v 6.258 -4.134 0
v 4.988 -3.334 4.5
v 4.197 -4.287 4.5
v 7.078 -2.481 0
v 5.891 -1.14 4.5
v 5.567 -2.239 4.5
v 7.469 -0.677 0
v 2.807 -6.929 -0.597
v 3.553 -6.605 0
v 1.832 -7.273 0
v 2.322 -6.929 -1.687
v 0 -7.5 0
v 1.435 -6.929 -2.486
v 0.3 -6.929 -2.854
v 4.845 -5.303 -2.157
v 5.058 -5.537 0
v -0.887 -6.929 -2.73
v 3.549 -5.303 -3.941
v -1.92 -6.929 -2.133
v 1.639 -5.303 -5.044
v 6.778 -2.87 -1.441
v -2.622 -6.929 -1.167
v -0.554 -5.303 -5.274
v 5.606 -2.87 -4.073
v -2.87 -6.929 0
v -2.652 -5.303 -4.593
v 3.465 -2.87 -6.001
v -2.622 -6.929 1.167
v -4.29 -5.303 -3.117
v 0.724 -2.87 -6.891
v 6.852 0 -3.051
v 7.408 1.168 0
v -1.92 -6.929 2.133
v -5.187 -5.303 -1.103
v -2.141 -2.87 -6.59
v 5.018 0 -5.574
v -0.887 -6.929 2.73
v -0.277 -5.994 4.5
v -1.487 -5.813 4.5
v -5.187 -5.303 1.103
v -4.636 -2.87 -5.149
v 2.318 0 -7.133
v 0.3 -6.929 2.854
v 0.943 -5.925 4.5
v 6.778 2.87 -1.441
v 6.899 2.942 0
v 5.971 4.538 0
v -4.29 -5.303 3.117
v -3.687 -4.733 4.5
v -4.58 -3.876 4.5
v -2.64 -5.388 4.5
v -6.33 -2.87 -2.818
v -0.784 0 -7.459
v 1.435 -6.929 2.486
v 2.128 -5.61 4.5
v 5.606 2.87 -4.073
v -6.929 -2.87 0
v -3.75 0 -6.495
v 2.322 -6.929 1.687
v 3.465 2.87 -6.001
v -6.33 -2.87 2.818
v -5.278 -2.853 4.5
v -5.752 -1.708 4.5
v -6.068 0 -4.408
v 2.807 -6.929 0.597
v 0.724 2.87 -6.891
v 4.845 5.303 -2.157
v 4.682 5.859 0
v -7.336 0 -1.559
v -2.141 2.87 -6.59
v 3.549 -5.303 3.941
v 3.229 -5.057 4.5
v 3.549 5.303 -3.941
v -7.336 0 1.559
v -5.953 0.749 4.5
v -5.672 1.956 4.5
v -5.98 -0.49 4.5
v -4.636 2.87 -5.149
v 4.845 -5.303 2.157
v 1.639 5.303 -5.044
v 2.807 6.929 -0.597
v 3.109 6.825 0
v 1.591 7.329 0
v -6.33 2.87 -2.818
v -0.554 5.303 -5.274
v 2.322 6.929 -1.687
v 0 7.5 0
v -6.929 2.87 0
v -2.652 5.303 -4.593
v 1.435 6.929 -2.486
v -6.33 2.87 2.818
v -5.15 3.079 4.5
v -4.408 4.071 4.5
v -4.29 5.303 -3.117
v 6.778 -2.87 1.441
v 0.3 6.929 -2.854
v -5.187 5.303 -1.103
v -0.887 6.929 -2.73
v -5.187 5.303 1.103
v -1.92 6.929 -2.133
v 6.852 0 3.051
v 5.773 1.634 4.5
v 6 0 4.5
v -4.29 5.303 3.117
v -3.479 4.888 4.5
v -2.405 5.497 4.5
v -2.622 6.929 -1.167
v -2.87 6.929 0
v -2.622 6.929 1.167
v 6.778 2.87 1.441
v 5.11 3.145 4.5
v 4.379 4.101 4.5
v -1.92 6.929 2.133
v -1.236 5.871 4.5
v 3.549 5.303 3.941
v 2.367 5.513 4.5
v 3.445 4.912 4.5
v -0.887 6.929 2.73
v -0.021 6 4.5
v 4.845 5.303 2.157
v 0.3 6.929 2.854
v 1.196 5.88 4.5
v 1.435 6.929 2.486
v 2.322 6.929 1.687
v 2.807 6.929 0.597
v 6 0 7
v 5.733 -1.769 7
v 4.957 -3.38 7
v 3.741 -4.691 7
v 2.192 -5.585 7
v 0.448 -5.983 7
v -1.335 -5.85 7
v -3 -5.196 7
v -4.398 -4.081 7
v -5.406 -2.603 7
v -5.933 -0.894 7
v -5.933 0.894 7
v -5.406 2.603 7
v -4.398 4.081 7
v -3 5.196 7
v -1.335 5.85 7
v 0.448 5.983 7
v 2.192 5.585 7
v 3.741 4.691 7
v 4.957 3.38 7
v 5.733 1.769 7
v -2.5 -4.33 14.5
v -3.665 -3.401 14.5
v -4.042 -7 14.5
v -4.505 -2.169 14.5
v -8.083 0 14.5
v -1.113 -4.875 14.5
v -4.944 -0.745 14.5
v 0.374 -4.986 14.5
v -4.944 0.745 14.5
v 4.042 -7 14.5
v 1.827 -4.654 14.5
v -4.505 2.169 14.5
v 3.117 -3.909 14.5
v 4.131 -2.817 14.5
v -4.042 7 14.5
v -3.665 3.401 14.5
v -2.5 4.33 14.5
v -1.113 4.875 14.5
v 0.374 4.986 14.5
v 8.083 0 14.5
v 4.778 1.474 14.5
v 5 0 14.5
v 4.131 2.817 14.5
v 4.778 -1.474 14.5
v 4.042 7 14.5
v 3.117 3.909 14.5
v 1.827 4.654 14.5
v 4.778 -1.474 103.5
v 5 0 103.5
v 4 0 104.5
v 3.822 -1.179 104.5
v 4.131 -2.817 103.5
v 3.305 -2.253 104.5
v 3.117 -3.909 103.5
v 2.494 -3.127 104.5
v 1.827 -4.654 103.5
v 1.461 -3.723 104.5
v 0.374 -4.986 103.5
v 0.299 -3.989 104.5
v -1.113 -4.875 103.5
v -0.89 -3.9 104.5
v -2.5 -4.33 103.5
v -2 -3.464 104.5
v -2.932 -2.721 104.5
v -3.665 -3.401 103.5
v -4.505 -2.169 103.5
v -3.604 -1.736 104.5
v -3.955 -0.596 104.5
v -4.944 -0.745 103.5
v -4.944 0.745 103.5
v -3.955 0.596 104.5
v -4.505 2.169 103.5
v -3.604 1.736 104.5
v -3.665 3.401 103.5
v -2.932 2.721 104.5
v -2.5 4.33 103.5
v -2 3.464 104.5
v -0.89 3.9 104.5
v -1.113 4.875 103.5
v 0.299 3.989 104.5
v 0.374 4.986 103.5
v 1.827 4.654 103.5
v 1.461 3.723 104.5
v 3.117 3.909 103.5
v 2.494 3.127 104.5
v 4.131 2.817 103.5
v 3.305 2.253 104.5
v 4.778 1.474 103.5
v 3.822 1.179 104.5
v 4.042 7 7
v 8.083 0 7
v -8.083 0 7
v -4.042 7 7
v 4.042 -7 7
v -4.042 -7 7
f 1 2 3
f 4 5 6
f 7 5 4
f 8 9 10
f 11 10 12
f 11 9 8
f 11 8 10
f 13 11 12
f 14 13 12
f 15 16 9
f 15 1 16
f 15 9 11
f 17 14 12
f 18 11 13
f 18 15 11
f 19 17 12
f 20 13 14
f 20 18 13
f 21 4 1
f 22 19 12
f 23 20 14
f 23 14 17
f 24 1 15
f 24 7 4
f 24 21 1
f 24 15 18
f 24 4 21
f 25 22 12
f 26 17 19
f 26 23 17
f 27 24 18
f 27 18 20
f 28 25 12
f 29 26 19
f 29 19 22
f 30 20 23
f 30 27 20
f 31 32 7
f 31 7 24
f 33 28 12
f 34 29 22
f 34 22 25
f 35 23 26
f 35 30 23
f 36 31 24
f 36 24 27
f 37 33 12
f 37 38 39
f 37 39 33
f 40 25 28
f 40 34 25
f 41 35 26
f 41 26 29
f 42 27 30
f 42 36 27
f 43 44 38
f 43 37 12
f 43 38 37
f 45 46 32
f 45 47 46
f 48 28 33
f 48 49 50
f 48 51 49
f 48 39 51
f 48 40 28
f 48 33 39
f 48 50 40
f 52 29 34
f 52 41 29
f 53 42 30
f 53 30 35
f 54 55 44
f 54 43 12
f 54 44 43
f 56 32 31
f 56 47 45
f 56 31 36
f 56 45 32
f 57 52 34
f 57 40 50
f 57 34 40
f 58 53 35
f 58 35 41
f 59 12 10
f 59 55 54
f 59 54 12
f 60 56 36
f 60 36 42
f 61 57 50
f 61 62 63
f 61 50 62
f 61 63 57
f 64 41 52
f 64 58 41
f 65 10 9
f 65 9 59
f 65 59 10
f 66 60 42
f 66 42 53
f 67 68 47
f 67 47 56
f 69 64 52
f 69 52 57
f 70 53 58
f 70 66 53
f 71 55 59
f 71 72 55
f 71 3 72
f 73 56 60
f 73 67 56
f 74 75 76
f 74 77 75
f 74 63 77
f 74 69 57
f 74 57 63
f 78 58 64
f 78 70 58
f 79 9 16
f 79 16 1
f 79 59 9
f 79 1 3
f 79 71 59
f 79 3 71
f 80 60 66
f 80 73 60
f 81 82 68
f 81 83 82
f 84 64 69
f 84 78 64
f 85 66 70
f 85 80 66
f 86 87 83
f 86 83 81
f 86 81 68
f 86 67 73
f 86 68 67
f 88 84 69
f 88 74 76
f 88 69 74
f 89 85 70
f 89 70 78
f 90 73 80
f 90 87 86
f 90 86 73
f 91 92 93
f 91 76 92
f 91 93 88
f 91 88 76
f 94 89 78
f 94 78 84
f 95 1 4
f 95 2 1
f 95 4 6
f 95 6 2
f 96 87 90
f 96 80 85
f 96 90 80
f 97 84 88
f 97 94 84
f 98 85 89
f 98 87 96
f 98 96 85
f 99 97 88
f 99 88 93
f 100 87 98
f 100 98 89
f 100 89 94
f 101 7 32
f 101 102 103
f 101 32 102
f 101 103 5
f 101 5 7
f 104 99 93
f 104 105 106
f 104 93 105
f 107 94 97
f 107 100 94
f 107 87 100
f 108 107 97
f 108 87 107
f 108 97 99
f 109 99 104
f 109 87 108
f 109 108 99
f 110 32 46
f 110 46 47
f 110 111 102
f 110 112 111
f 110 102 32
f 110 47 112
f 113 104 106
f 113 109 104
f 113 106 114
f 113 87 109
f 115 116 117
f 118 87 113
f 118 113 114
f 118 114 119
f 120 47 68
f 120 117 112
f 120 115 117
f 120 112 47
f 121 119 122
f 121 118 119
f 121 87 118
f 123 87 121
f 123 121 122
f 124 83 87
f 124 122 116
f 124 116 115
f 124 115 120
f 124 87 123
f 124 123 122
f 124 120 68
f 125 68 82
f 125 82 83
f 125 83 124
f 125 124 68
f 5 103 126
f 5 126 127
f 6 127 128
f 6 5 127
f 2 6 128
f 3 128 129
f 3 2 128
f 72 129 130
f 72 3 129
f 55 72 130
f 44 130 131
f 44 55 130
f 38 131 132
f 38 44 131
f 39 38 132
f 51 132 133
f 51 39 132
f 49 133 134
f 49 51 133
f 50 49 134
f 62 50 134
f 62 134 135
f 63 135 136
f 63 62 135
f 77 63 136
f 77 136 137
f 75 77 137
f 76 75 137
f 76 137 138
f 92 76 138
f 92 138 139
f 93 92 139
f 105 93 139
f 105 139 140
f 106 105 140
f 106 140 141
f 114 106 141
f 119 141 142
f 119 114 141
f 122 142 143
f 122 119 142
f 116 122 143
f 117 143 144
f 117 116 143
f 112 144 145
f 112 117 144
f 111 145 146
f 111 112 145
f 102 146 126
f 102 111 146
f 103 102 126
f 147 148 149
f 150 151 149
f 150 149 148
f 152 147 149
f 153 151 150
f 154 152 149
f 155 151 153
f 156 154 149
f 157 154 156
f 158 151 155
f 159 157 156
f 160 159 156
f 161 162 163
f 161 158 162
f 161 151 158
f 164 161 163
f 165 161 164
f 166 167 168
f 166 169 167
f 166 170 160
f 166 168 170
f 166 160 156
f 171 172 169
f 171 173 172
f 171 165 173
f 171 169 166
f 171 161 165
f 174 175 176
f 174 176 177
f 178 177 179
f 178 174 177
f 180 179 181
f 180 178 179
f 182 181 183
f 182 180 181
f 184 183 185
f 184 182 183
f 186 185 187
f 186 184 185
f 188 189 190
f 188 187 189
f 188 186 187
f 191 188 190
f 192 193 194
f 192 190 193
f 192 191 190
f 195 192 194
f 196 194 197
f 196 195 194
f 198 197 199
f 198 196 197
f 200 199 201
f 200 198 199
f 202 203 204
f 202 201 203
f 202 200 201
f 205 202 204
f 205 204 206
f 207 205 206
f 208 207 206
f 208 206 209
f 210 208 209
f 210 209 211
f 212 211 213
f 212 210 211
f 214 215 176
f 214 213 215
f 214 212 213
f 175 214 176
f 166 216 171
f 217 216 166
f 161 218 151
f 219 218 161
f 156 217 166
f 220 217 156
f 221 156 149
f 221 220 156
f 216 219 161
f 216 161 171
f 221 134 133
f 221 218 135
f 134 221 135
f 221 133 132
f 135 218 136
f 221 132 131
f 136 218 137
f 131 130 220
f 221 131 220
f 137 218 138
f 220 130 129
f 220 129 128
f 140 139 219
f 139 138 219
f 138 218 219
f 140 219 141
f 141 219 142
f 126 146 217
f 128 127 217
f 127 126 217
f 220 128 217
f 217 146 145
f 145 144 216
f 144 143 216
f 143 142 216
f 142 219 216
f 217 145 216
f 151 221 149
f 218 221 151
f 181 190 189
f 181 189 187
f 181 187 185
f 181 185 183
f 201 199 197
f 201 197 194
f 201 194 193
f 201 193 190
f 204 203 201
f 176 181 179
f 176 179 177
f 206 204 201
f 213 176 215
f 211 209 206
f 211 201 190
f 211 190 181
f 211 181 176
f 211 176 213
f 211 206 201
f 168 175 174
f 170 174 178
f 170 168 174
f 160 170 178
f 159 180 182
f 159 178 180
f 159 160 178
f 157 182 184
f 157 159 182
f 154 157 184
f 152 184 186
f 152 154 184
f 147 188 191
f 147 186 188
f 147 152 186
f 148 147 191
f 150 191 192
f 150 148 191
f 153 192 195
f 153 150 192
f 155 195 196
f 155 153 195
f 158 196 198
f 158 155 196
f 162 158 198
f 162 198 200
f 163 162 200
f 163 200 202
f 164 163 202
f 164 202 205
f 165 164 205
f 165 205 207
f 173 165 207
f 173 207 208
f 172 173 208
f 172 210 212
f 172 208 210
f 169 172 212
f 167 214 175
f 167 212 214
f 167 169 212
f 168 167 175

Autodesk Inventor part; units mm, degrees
ref_plane "YZ Plane" through (0, 0, 0) normal (1, 0, 0) x (0, 1, 0)
ref_plane "XZ Plane" through (0, 0, 0) normal (0, 1, 0) x (-1, 0, 0)
ref_plane "XY Plane" through (0, 0, 0) normal (0, 0, 1) x (1, 0, 0)
sketch "Sketch1" plane through (0, 0, 0) normal (0, 0, 1) x (1, 0, 0)
  arc A0 (0, -7.5) -> (0, 7.5) centre (0, 0) ccw
  line L0 (0, -7.5) -> (0, 7.5)
  dimension "d5" = 15
revolve "Revolution1" add sketch "Sketch1" angle 360 about axis through (0, -7.5, 0) along (0, 1, 0)
sketch "Sketch2" plane through (0, 0, 0) normal (0, 0, 1) x (1, 0, 0)
  circle A0 centre (0, 0) radius 6
  dimension "d2" = 12
extrude "Extrusion1" add sketch "Sketch2" along normal blind 7
sketch "Sketch3" plane through (0, 0, 7) normal (0, 0, 1) x (1, 0, 0)
  circle A0 centre (0, 0) radius 6 projected
  line L0 (-4.0415, 7) -> (4.0415, 7)
  line L1 (4.0415, 7) -> (8.0829, 0)
  line L2 (8.0829, 0) -> (4.0415, -7)
  line L3 (4.0415, -7) -> (-4.0415, -7)
  line L4 (-4.0415, -7) -> (-8.0829, 0)
  line L5 (-8.0829, 0) -> (-4.0415, 7)
  point P0 (0, -7)
  dimension "d6" = 120
  dimension "d7" = 120
  dimension "d8" = 14
extrude "Extrusion2" add sketch "Sketch3" along normal blind 7.5 contours A0 | L0 L1 L2 L3 L4 L5
sketch "Sketch4" plane through (0, 0, 14.5) normal (0, 0, 1) x (1, 0, 0)
  circle A0 centre (0, 0) radius 5
  point P0 (0, 0)
  dimension "d11" = 10
extrude "Extrusion3" add sketch "Sketch4" along normal blind 90
thread "Thread1" size "M10x1.5" class "6g" standard "ANSI Metric M Profile" length 88 offset 2
chamfer "Chamfer1" distance 1 angle 45 1 edges at (-5, 0, 104.5)
properties part number "21.1846 THREADED STUD 10mm" material "Steel"
